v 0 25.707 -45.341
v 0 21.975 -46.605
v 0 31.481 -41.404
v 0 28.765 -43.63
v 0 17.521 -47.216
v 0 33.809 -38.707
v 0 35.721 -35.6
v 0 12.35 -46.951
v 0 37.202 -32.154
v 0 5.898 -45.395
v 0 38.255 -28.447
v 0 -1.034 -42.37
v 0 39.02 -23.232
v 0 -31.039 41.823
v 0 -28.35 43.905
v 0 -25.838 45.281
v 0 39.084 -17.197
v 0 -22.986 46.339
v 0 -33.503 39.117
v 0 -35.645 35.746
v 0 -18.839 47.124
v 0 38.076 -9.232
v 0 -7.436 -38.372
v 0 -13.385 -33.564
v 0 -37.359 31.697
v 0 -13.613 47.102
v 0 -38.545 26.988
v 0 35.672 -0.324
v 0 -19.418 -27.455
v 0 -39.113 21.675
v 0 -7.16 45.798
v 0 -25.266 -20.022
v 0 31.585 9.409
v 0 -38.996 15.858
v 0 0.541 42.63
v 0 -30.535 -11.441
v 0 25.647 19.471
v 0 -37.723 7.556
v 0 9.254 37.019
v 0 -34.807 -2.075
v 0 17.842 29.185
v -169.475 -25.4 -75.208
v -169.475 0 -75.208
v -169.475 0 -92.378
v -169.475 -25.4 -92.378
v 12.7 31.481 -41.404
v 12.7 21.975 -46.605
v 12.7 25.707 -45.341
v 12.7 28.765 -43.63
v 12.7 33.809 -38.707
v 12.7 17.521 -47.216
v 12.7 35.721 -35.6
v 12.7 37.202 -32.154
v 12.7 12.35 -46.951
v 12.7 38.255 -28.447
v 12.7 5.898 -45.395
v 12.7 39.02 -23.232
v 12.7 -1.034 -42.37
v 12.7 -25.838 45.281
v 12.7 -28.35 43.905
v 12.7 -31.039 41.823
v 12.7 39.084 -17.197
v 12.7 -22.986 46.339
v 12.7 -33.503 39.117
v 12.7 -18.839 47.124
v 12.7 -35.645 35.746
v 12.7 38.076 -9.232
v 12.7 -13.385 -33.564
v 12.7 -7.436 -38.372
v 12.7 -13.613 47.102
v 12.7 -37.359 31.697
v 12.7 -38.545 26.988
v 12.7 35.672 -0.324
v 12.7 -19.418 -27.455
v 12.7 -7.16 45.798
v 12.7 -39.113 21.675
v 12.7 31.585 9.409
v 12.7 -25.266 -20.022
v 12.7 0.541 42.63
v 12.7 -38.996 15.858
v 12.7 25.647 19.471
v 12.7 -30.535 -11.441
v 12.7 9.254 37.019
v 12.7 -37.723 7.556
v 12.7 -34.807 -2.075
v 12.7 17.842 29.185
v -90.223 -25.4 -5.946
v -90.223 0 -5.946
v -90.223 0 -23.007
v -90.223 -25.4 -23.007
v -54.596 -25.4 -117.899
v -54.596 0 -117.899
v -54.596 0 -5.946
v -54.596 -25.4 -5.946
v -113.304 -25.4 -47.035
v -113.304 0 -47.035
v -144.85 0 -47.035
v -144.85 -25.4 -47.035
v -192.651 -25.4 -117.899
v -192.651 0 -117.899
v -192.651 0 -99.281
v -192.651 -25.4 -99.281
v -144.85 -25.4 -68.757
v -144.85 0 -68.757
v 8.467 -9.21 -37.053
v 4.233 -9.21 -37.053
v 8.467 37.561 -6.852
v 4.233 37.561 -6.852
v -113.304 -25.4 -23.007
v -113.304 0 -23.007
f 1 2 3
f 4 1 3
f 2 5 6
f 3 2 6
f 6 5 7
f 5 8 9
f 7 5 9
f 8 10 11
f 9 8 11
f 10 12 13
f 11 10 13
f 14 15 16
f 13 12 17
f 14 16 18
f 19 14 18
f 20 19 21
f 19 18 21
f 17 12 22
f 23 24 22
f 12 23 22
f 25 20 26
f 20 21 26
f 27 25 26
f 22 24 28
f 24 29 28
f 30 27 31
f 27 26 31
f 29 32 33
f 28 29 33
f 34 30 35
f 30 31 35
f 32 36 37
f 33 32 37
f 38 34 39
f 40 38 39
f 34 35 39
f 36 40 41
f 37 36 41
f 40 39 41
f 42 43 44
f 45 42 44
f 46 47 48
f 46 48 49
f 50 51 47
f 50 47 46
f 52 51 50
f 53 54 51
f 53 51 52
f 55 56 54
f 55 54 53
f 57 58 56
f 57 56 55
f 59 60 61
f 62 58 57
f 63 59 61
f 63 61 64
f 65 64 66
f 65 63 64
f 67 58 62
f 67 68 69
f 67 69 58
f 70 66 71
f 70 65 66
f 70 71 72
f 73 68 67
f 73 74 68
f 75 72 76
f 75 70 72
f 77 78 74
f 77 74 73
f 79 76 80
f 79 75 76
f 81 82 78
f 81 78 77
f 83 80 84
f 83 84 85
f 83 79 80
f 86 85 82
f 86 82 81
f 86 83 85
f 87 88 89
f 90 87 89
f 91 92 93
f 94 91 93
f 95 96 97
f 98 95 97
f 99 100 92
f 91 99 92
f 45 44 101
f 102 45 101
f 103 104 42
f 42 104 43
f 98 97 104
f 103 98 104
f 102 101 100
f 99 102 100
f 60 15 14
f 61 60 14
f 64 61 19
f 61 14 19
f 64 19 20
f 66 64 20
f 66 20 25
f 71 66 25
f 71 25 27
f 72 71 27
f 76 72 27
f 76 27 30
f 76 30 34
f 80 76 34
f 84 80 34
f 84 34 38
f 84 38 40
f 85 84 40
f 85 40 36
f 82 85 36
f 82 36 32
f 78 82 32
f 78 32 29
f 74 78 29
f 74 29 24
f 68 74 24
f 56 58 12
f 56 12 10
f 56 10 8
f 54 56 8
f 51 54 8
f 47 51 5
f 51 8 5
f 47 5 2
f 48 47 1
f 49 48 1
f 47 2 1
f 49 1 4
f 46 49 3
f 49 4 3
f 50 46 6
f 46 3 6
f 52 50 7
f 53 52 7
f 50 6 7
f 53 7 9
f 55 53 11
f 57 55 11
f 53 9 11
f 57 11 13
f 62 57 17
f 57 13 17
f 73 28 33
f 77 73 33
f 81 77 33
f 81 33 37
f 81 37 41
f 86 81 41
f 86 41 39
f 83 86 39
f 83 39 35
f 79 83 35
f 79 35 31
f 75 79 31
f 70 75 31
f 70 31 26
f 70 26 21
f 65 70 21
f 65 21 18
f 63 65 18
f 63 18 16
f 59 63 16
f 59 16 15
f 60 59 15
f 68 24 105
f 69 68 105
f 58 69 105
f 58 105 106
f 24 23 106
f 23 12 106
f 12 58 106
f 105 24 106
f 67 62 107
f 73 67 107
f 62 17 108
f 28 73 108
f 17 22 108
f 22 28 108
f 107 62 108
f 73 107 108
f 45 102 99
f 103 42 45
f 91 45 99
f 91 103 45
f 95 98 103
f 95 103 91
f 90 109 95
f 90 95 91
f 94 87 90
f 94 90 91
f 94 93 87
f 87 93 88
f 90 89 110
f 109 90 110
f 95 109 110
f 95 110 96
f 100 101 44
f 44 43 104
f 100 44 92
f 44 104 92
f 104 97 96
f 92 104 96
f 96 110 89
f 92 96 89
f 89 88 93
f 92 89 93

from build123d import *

# Parameters (mm, degrees)
F1_DEPTH = 12.7
F2_DEPTH = 7.62
F4_DEPTH = 25.4


with BuildPart() as f1:
    # F0 (on Right) → F1 (new body)
    with BuildSketch(Plane.YZ):
        with BuildLine():
            add(Edge.make_bspline(
                [(-28.350314, 43.905351), (-75.121301, 13.704656), (-9.210336, -37.053024), (56.700628, -87.810703), (37.56065, -6.852328), (18.420672, 74.106047), (-28.350314, 43.905351)],
                knots=[0, 0, 0, 2.094395, 2.094395, 4.18879, 4.18879, 6.283185, 6.283185, 6.283185], degree=2, weights=[1, 0.5, 1, 0.5, 1, 0.5, 1]))
        make_face()
    extrude(amount=F1_DEPTH)

    # F0 (on Right) → F2 (join)
    with BuildSketch(Plane.YZ):
        with BuildLine():
            add(Edge.make_bspline(
                [(-28.350314, 43.905351), (-75.121301, 13.704656), (-9.210336, -37.053024), (56.700628, -87.810703), (37.56065, -6.852328), (18.420672, 74.106047), (-28.350314, 43.905351)],
                knots=[0, 0, 0, 2.094395, 2.094395, 4.18879, 4.18879, 6.283185, 6.283185, 6.283185], degree=2, weights=[1, 0.5, 1, 0.5, 1, 0.5, 1]))
        make_face()
    extrude(amount=F2_DEPTH)


with BuildPart() as f4:
    # F3 (on Front) → F4 (new body)
    with BuildSketch(Plane.XZ):
        Polygon((-192.650631, -99.280551), (-192.650631, -117.898986), (-54.596458, -117.898986), (-54.596458, -5.946344), (-90.222508, -5.946344), (-90.222508, -23.006715), (-113.304183, -23.006715), (-113.304183, -47.035228), (-144.850105, -47.035228), (-144.850105, -68.756744), (-169.474617, -75.208202), (-169.474617, -92.378132), align=None)
    extrude(amount=F4_DEPTH)


solid = Compound([f1.part, f4.part])
